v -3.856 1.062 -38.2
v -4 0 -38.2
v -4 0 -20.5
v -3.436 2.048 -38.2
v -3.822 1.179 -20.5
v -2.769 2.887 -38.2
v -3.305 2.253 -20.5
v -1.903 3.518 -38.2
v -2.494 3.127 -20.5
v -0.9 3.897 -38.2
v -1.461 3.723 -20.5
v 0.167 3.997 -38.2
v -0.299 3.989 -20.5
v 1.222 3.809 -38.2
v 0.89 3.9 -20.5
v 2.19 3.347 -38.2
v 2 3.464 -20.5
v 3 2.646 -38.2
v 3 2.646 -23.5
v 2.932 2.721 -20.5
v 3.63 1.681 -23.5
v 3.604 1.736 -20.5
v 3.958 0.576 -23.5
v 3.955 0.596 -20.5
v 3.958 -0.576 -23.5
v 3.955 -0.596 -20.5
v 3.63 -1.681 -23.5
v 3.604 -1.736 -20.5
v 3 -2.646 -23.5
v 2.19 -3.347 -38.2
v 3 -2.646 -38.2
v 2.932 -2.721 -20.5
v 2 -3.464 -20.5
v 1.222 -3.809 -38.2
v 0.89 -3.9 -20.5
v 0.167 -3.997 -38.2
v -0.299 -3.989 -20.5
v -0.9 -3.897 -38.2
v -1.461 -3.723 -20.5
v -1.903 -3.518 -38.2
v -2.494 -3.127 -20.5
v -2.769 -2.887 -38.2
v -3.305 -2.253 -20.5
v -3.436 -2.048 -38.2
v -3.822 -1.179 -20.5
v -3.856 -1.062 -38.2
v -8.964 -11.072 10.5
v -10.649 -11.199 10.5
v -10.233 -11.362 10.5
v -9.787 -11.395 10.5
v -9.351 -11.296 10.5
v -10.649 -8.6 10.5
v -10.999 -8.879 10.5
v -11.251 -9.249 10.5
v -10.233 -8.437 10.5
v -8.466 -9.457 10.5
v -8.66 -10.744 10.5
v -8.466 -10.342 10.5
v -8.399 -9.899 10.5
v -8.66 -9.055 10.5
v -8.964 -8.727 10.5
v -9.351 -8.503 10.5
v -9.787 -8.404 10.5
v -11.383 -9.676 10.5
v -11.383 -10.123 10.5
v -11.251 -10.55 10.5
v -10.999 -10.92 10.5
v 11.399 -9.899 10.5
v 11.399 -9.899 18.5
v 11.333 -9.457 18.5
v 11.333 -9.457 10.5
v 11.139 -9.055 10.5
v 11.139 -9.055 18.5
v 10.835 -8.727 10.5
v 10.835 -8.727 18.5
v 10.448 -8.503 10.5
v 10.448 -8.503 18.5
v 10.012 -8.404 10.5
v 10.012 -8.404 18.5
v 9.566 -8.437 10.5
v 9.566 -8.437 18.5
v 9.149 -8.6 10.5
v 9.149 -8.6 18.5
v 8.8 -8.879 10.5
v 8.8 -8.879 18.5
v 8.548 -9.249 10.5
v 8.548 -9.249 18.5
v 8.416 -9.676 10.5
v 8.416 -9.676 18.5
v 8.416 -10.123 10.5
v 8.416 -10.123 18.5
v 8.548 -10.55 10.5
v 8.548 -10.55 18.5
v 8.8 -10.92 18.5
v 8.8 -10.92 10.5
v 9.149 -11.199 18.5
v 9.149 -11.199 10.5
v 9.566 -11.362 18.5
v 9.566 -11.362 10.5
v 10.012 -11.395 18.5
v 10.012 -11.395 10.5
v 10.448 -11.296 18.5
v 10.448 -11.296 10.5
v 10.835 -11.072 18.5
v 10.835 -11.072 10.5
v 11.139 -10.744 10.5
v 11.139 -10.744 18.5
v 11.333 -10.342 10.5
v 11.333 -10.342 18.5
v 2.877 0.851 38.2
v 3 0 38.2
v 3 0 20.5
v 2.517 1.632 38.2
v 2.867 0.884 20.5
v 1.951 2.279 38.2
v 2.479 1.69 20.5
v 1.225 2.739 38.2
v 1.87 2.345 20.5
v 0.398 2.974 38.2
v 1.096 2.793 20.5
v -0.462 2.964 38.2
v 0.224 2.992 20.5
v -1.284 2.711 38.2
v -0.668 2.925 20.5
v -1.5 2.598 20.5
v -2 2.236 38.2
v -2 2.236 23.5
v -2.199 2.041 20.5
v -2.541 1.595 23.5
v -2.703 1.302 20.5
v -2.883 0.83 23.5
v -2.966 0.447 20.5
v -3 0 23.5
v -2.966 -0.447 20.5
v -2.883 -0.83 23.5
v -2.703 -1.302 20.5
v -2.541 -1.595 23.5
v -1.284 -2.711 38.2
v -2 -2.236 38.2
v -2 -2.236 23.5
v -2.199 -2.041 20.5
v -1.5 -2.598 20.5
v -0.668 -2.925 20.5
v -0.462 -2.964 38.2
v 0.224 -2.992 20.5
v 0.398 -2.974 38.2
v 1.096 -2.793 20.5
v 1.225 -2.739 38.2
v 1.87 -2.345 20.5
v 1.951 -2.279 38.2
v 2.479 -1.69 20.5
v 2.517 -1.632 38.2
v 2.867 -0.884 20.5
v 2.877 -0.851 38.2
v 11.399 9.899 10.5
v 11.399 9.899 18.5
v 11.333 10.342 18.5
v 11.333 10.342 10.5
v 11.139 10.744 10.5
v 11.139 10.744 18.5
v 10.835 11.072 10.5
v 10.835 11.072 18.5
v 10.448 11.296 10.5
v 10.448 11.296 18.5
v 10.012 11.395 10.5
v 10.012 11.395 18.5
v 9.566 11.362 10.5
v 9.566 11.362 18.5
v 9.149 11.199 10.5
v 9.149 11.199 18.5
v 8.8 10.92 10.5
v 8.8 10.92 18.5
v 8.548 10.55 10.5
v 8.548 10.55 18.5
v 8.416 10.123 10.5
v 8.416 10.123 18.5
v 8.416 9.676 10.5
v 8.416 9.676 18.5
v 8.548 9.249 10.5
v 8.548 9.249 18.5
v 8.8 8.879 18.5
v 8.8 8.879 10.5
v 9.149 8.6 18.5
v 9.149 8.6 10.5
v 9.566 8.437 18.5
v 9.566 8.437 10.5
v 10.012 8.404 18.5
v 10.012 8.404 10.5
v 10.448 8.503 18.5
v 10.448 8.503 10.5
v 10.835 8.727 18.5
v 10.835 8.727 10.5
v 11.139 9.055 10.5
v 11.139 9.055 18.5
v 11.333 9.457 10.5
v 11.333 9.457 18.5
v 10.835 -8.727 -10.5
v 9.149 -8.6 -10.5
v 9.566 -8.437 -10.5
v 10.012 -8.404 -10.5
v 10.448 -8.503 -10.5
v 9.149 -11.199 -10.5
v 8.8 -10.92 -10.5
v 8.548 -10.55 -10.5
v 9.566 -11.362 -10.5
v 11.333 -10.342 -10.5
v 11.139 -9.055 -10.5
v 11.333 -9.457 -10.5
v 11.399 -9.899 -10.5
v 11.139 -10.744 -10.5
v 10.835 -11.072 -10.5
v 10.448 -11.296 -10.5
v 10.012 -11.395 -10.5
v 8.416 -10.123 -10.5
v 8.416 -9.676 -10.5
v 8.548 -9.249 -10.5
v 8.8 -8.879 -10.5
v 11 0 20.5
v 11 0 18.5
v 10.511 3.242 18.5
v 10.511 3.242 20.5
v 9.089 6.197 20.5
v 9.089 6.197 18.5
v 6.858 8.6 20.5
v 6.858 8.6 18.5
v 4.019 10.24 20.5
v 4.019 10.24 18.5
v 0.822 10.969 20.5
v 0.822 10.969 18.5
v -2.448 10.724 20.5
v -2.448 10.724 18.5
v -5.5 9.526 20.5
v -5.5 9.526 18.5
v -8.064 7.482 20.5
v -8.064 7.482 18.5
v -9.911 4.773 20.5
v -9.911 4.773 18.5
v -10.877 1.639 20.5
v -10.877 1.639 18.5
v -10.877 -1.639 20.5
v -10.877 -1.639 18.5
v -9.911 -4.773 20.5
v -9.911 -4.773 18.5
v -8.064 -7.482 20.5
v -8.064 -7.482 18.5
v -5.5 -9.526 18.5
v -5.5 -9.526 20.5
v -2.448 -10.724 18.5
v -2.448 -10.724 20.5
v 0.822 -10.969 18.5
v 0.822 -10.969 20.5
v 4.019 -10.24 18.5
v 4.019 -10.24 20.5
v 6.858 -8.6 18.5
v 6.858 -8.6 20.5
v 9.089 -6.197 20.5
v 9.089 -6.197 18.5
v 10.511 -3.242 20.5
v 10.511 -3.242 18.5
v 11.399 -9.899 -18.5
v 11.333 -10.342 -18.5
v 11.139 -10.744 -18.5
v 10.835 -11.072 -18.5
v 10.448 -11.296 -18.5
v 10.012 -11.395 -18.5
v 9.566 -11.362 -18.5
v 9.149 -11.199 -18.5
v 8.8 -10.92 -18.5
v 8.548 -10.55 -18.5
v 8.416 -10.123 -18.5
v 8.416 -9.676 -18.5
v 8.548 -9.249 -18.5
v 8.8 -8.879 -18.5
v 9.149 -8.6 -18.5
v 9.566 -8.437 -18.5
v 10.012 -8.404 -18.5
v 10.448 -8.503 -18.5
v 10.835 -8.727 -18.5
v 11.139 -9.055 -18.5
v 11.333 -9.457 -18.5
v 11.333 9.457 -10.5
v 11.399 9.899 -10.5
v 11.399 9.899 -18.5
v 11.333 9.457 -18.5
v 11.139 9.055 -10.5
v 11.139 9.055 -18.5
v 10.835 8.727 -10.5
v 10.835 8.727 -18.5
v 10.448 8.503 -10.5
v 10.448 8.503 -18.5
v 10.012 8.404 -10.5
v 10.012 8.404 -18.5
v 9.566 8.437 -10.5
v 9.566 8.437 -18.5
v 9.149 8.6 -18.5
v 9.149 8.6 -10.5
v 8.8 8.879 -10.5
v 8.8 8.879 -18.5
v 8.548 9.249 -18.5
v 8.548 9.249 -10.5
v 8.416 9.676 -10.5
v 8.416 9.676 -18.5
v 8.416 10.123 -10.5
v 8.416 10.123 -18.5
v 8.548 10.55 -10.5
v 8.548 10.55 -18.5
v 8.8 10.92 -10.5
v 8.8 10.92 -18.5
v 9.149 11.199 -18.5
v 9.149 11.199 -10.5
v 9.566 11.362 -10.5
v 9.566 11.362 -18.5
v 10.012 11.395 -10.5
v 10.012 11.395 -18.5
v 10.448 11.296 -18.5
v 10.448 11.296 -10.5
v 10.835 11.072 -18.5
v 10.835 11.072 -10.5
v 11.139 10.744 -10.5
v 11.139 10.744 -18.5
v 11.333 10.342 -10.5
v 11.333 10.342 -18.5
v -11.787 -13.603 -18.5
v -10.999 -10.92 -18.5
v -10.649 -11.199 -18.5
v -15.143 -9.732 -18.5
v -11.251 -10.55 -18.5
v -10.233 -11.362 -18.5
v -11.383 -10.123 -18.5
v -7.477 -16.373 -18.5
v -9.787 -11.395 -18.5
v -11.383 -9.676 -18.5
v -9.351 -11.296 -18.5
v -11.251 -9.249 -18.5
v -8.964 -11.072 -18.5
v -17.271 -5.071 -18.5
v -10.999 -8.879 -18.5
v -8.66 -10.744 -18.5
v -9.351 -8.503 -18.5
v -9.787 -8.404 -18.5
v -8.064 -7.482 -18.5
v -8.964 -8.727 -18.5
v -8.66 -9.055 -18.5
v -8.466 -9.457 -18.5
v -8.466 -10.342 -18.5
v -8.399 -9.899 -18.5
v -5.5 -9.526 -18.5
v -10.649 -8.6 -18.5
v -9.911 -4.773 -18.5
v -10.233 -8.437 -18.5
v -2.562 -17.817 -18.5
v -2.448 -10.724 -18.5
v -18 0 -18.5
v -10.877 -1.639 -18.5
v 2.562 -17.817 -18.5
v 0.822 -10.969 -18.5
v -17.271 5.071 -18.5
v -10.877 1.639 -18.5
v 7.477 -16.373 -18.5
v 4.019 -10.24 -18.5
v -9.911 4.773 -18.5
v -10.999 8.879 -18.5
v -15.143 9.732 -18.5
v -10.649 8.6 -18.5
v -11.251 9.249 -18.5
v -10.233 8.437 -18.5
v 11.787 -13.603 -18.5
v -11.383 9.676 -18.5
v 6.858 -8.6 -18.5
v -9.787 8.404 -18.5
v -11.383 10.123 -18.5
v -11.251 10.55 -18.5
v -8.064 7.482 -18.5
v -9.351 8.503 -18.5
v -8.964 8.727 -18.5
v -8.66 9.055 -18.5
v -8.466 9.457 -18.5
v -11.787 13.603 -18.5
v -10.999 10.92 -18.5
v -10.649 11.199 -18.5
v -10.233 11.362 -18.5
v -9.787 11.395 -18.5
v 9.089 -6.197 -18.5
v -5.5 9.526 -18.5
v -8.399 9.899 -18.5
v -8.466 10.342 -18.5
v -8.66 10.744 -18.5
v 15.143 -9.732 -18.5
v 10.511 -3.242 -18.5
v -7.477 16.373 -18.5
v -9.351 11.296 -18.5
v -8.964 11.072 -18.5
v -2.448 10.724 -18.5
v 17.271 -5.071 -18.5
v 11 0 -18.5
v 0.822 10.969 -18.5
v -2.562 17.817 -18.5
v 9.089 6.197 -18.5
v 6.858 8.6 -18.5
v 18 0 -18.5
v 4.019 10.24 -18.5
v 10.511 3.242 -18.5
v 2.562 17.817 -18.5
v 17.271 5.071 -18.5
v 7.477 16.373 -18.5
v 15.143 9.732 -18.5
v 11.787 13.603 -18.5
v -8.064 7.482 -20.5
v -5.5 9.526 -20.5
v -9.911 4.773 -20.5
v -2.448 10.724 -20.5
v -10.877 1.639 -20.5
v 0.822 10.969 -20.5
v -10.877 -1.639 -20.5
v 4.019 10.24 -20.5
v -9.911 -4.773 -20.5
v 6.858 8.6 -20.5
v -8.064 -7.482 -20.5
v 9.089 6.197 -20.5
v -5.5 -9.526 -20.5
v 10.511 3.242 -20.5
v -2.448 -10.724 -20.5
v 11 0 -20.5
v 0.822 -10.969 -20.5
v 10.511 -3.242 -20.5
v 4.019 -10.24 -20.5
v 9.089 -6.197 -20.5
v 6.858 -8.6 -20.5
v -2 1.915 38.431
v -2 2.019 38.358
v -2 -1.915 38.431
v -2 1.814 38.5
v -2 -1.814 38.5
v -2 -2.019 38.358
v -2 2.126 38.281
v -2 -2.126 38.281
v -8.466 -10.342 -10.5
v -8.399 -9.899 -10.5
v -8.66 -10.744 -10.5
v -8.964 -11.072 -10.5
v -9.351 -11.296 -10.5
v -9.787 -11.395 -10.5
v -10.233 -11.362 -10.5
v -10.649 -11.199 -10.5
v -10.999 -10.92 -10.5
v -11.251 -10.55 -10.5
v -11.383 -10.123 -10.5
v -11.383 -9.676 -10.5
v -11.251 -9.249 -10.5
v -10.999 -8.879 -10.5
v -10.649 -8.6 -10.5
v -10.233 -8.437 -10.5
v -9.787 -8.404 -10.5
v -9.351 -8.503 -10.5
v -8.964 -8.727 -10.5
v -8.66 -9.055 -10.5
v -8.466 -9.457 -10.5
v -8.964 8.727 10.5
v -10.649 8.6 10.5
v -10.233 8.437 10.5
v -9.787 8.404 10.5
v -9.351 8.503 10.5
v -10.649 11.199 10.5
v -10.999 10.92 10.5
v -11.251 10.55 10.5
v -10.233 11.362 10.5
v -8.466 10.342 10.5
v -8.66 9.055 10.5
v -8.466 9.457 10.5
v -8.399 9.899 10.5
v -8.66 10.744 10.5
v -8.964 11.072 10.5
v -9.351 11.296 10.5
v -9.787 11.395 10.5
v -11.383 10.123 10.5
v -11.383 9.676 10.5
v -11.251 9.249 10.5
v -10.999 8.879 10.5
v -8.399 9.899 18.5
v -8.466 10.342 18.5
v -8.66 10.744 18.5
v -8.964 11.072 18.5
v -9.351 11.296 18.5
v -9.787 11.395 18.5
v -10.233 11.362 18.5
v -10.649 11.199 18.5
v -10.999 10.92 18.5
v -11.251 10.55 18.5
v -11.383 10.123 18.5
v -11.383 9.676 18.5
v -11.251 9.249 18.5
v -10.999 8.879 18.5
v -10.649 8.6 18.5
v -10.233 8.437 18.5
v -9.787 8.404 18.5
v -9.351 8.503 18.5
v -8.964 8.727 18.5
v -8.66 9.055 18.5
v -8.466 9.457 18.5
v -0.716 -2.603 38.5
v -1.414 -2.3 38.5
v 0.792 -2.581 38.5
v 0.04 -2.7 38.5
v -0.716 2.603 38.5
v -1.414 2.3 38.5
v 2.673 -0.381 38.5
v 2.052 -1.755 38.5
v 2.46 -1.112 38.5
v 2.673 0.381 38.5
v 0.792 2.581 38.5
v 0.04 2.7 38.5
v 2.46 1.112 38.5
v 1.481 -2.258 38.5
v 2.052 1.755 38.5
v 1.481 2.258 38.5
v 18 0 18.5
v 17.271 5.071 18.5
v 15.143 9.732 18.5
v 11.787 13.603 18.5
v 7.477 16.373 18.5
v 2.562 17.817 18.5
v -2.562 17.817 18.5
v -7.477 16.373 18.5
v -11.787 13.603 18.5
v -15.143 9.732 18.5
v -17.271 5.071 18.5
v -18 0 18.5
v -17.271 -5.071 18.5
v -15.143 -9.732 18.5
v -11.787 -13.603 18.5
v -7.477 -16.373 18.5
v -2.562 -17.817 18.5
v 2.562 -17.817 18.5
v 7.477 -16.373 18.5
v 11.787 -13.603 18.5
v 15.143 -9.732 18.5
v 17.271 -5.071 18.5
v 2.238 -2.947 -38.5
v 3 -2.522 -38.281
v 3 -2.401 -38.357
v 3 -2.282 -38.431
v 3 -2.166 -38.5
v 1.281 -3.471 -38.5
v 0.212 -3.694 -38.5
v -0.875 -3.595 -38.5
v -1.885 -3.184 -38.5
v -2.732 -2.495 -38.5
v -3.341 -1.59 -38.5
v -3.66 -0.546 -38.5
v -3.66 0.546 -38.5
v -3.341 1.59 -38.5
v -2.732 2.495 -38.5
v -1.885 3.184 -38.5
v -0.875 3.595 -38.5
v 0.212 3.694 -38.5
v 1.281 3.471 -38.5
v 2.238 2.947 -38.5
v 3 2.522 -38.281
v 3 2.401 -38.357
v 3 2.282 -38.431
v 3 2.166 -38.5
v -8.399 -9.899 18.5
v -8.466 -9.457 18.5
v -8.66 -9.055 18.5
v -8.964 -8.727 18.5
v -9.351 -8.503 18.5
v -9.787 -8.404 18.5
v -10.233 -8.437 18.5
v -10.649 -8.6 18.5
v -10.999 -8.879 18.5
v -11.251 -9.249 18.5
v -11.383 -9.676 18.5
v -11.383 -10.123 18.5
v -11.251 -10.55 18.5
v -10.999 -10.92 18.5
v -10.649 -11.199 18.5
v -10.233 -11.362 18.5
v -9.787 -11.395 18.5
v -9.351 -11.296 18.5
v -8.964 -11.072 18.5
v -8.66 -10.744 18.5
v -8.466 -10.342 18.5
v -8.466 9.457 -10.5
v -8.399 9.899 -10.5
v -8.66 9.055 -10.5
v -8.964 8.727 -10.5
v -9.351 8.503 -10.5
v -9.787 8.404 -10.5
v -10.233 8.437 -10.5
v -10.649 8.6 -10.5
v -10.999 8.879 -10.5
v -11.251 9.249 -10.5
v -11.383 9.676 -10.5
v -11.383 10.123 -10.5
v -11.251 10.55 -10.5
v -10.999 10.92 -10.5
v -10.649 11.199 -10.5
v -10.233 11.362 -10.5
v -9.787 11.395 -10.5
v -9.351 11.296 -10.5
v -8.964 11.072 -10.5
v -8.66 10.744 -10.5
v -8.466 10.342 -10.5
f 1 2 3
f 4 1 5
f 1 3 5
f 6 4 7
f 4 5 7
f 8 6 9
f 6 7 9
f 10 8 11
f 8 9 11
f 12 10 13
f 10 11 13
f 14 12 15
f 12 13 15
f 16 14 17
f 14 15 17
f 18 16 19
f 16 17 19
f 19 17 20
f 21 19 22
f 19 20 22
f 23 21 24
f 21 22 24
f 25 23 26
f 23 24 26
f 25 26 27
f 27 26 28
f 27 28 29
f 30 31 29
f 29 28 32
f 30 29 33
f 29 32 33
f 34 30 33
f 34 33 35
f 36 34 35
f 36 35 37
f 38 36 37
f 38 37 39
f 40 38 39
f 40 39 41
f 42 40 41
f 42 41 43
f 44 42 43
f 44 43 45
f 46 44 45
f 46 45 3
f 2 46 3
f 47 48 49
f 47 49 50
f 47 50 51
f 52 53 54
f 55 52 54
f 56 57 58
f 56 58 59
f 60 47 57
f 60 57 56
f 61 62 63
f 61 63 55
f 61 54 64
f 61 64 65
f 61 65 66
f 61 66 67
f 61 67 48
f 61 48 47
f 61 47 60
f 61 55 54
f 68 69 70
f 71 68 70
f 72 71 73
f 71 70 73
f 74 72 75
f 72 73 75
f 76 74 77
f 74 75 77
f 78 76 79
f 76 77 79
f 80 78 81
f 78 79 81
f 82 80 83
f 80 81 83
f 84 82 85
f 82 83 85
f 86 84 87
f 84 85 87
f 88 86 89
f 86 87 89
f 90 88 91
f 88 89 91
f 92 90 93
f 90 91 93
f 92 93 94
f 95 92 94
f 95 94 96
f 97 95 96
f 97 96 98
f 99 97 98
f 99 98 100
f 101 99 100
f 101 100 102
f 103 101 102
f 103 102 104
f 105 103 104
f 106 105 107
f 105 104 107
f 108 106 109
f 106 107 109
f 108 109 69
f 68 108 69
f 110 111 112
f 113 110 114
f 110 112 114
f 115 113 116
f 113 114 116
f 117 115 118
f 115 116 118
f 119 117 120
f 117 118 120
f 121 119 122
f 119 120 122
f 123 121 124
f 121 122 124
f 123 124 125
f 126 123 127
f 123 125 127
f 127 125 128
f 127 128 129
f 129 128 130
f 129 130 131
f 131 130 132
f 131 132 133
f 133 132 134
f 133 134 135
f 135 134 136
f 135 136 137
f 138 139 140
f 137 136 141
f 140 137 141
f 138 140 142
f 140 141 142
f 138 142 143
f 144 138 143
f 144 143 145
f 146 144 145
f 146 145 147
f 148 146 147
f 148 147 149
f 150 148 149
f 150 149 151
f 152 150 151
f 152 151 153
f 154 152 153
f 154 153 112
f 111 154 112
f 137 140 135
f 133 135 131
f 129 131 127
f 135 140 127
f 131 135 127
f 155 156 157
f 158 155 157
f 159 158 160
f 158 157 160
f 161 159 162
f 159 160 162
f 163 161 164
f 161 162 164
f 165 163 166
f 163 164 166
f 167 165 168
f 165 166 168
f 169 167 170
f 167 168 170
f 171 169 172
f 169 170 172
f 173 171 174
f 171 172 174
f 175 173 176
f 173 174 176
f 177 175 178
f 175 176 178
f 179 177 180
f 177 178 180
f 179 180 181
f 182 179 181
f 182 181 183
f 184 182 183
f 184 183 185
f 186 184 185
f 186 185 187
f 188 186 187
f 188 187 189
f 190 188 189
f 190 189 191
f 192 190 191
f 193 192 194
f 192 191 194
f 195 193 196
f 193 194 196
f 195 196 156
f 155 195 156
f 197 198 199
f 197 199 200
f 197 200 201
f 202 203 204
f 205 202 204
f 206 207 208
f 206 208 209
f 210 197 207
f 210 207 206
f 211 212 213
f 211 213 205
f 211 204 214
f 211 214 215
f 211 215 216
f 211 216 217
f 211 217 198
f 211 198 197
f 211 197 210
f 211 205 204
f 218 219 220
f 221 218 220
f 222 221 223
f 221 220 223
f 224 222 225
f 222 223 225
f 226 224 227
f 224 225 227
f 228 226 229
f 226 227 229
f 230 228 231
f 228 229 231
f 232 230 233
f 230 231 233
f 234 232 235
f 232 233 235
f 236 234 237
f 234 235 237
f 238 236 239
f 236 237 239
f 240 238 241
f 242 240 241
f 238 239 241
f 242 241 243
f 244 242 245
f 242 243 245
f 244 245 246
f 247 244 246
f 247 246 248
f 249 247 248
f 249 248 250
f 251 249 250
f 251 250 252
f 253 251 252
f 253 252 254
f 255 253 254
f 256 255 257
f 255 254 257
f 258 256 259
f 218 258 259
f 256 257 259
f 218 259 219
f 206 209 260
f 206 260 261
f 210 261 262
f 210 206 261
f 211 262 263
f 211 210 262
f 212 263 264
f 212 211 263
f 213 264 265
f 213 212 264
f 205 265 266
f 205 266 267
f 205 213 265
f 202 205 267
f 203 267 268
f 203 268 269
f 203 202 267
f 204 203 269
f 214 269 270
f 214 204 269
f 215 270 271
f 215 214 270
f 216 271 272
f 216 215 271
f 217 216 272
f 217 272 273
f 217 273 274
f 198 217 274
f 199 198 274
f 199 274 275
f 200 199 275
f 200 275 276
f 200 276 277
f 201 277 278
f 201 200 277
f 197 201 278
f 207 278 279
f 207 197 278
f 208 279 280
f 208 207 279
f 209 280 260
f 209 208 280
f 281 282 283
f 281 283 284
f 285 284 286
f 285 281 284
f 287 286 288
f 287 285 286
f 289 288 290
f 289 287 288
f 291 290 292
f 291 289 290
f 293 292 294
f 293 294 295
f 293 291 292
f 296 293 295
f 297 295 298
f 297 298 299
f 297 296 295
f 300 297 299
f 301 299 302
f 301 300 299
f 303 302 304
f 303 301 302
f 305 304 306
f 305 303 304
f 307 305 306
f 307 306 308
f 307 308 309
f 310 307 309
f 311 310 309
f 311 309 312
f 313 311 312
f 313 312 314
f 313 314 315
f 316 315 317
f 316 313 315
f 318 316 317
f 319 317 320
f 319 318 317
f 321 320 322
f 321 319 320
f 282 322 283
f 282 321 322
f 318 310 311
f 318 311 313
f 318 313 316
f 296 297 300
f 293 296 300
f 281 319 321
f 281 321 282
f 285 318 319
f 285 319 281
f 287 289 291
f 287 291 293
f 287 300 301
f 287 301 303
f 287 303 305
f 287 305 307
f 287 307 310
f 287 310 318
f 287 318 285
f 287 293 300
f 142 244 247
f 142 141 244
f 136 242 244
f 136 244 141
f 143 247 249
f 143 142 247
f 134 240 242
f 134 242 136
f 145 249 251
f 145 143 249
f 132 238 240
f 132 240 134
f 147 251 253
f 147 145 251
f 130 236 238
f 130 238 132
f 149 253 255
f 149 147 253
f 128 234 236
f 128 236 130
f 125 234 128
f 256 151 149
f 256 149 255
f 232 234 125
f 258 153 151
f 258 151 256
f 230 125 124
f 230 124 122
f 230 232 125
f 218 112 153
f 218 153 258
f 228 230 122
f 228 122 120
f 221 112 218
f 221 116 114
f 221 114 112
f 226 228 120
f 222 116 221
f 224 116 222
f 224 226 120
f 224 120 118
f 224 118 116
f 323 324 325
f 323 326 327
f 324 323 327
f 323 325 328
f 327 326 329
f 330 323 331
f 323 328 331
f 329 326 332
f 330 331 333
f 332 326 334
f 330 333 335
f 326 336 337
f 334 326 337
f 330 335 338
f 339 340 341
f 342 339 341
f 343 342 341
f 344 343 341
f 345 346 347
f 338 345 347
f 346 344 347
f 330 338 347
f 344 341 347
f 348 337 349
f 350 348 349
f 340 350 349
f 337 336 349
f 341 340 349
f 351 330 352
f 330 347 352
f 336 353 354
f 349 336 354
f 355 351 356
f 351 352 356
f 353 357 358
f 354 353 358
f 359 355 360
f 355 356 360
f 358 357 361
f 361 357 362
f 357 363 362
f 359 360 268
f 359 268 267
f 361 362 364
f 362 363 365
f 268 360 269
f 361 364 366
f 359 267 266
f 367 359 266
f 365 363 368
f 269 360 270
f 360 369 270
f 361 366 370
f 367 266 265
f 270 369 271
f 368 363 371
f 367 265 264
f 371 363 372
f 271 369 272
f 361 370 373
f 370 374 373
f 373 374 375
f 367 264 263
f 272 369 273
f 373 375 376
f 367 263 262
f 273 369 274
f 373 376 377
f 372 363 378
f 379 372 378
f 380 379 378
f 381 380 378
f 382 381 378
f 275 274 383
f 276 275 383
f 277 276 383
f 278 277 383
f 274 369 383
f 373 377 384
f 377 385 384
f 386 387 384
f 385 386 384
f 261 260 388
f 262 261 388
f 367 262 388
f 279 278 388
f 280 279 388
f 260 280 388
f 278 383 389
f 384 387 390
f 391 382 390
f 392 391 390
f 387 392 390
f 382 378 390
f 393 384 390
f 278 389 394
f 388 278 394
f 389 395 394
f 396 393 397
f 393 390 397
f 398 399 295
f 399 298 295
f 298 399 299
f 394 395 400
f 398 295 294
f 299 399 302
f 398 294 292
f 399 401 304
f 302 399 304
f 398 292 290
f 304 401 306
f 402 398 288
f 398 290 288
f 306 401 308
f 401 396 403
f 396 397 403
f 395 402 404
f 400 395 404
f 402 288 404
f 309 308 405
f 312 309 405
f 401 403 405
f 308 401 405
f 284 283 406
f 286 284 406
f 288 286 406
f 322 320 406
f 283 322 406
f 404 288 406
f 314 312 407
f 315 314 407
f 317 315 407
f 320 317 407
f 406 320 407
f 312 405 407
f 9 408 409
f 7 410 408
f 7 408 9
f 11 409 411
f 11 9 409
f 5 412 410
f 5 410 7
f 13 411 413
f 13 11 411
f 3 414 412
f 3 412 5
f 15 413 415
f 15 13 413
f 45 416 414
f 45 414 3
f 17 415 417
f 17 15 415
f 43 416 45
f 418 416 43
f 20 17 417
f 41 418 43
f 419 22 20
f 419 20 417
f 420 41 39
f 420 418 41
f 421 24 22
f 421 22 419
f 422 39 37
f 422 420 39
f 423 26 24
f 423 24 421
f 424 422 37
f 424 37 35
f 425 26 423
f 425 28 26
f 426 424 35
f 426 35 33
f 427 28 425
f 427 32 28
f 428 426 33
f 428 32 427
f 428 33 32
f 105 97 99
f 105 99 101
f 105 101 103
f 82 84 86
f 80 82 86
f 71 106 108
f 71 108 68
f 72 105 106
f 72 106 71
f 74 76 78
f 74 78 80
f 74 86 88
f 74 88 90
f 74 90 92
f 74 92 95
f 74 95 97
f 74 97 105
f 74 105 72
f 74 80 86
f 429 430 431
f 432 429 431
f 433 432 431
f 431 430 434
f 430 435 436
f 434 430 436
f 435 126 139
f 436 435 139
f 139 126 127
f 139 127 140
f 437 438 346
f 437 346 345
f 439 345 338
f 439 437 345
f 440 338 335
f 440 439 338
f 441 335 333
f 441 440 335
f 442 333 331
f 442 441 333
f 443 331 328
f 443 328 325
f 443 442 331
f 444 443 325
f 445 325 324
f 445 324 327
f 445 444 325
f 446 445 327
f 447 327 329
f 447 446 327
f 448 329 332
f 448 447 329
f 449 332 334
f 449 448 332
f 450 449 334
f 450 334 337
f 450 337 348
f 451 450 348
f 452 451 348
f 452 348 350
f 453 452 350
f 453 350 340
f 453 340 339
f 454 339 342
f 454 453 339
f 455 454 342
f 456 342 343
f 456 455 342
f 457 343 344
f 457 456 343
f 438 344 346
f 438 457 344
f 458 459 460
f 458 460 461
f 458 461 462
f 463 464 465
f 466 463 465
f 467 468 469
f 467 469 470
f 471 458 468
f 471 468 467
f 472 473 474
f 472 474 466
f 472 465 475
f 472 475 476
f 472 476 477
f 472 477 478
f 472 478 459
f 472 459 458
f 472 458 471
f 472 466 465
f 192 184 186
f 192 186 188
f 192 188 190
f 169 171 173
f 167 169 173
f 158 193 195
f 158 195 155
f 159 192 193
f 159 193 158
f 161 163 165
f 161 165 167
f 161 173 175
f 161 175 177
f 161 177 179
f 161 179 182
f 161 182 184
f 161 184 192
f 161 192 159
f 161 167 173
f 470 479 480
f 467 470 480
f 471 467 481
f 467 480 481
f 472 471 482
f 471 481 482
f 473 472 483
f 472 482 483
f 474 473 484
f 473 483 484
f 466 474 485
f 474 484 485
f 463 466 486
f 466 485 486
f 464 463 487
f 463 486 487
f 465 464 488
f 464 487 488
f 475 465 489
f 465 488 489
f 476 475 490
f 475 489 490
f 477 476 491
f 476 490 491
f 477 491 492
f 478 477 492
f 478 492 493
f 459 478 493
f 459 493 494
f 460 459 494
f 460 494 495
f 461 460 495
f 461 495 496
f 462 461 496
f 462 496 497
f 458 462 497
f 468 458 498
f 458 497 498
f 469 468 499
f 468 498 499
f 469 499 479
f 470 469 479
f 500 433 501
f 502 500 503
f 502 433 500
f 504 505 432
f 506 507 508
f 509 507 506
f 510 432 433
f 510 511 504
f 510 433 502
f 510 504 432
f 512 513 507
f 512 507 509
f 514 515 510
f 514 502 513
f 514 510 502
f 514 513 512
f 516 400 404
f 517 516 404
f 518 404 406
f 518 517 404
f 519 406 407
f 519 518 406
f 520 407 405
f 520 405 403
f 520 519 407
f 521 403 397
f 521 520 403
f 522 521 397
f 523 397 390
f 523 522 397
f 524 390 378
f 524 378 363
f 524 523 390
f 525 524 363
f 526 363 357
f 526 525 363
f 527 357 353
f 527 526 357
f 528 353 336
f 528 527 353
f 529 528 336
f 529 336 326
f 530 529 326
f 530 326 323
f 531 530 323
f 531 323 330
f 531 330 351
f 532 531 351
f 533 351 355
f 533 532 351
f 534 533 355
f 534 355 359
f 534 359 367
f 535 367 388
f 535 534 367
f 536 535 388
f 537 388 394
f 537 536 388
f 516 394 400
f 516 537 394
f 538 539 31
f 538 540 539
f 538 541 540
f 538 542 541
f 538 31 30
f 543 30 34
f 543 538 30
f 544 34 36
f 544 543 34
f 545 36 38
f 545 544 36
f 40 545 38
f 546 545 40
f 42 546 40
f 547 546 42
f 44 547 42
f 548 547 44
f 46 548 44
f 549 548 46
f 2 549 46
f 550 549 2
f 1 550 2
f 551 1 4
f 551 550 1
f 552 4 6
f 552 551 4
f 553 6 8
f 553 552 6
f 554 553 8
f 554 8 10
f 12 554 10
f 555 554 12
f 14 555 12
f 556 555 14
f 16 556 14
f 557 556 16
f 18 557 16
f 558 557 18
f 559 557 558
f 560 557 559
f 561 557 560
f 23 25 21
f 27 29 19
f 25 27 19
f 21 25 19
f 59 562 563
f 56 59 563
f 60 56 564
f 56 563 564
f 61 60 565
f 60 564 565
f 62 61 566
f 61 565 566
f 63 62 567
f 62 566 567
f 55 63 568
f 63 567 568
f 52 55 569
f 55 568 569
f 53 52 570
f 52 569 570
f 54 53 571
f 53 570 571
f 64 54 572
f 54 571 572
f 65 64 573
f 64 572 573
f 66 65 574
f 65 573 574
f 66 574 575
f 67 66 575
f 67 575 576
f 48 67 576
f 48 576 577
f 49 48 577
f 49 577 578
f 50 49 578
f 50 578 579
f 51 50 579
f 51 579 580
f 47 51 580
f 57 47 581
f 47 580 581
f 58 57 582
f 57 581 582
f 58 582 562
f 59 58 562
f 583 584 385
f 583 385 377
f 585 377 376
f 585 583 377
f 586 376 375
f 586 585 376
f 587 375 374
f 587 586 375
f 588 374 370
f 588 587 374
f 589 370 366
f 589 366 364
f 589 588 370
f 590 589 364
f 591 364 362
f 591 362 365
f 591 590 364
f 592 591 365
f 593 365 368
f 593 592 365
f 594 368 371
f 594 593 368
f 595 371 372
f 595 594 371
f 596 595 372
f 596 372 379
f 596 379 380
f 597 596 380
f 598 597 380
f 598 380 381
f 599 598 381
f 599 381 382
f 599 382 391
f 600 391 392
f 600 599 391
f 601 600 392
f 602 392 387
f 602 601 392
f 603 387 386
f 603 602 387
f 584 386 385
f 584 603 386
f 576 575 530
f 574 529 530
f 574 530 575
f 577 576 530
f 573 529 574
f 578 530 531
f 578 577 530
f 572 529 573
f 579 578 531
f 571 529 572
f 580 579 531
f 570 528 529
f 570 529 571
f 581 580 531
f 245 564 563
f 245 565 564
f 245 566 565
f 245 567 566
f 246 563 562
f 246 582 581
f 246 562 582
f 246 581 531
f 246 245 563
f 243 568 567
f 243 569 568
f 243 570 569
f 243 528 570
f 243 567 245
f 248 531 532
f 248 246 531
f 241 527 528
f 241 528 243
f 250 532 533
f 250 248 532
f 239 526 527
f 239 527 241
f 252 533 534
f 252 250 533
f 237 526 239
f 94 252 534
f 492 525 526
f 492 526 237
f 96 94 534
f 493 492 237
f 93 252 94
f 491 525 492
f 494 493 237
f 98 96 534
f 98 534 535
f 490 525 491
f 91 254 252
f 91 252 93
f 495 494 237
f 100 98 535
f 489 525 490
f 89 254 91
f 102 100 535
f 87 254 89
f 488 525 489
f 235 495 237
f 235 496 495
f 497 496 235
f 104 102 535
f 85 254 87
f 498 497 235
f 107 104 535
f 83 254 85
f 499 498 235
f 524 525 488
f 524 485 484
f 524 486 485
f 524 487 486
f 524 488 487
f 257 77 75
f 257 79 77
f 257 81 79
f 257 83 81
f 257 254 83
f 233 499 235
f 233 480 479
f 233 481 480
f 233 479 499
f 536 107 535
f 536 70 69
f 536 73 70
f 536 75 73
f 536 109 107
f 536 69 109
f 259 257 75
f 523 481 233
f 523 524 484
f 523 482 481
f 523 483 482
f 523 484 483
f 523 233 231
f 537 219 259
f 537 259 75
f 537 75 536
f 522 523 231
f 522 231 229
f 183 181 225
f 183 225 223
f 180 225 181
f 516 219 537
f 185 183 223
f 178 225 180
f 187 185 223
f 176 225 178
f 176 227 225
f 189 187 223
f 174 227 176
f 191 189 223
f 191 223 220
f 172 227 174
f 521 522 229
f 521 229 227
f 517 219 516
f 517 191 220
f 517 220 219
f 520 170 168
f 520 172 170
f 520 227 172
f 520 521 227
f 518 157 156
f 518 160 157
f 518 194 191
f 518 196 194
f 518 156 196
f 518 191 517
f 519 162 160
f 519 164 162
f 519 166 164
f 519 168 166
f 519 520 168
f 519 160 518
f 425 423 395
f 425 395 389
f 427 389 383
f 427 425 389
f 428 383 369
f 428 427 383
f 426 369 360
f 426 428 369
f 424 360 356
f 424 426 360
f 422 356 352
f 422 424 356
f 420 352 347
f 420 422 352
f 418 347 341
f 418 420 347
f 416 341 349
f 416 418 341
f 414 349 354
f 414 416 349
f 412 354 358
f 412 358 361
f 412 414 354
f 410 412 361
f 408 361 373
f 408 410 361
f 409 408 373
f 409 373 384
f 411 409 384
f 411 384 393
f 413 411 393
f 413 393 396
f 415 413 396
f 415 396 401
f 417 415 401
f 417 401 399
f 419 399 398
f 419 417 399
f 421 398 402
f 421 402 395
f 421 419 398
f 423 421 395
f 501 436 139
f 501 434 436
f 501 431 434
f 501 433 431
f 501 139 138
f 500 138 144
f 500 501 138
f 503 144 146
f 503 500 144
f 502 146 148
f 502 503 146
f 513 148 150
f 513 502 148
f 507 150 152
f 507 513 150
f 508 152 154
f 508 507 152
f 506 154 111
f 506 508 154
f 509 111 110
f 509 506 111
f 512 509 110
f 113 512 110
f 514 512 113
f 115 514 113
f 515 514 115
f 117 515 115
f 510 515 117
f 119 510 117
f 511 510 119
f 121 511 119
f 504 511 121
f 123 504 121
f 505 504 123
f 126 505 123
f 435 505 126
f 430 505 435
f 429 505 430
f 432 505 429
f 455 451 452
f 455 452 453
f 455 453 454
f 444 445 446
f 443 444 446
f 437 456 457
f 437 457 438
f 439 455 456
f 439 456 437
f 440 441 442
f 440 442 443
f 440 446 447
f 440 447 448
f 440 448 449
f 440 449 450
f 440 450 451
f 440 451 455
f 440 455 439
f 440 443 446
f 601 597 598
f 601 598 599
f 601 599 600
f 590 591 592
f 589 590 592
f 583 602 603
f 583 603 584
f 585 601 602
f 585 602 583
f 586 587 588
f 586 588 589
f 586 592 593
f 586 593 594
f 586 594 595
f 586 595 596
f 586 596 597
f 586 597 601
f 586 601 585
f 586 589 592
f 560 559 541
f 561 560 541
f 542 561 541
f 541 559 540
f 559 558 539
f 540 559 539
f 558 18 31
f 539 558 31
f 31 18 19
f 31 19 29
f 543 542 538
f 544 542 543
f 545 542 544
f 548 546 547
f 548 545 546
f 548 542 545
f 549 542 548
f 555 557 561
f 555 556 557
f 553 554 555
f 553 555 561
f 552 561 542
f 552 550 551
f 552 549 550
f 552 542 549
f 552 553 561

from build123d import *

# Parameters (mm, degrees)
SKETCH_1_R          = 18
EXTRUDE_1_DEPTH     = 18.5
SKETCH_2_R          = 3
EXTRUDE_2_DEPTH     = 20
SKETCH_3_R          = 11
EXTRUDE_3_DEPTH     = 2
SKETCH_4_R          = 1.5
CUT_EXTRUDE_1_DEPTH = 8
SKETCH_5_R          = 4
EXTRUDE_4_DEPTH     = 20
EXTRUDE_START       = 2
SKETCH_6_R          = 11
EXTRUDE_5_DEPTH     = 2
CUT_EXTRUDE_START   = -8
SKETCH_7_R          = 1.5
CUT_EXTRUDE_2_DEPTH = 8
CUT_EXTRUDE_START_2 = -15
CUT_EXTRUDE_3_DEPTH = 15
CUT_EXTRUDE_4_DEPTH = 15
CHAMFER_1_SIZE      = 0.3


with BuildPart() as part:
    # 草图1 → 凸台-拉伸1 (new, symmetric)
    with BuildSketch(Plane.XY):
        Circle(SKETCH_1_R)
    extrude(amount=EXTRUDE_1_DEPTH, both=True)

    # 草图2 → 凸台-拉伸2 (add)
    with BuildSketch(Plane.XY.offset(18.5)):
        Circle(SKETCH_2_R)
    extrude(amount=EXTRUDE_2_DEPTH)

    # 草图3 → 凸台-拉伸3 (add)
    with BuildSketch(Plane.XY.offset(18.5)):
        Circle(SKETCH_3_R)
    extrude(amount=EXTRUDE_3_DEPTH)

    # 草图4 → 切除-拉伸1 (cut)
    with BuildSketch(Plane.XY.offset(18.5)):
        with Locations((-9.899494937, 9.899494937)):
            Circle(SKETCH_4_R)
        with Locations((9.899494937, 9.899494937)):
            Circle(SKETCH_4_R)
        with Locations((9.899494937, -9.899494937)):
            Circle(SKETCH_4_R)
        with Locations((-9.899494937, -9.899494937)):
            Circle(SKETCH_4_R)
    extrude(amount=-CUT_EXTRUDE_1_DEPTH, mode=Mode.SUBTRACT)

    # 草图5 → 凸台-拉伸4 (add)
    with BuildSketch(Plane(origin=(0, 0, -18.5), x_dir=(-1, 0, 0), z_dir=(0, 0, -1))):
        Circle(SKETCH_5_R)
    extrude(amount=EXTRUDE_4_DEPTH)

    # 草图6 → 凸台-拉伸5 (add)
    with BuildSketch(Plane(origin=(0, 0, -18.5), x_dir=(-1, 0, 0), z_dir=(0, 0, -1)).offset(EXTRUDE_START)):
        with Locations(Location((0, 0, 0), (0, 0, 180))):
            Circle(SKETCH_6_R)
    extrude(amount=-EXTRUDE_5_DEPTH)

    # 草图7 → 切除-拉伸2 (cut)
    with BuildSketch(Plane(origin=(0, 0, -18.5), x_dir=(-1, 0, 0), z_dir=(0, 0, -1)).offset(CUT_EXTRUDE_START)):
        with Locations(Location((-9.899494937, 9.899494937, 0), (0, 0, 180))):
            Circle(SKETCH_7_R)
        with Locations(Location((9.899494937, 9.899494937, 0), (0, 0, 180))):
            Circle(SKETCH_7_R)
        with Locations(Location((9.899494937, -9.899494937, 0), (0, 0, 180))):
            Circle(SKETCH_7_R)
        with Locations(Location((-9.899494937, -9.899494937, 0), (0, 0, 180))):
            Circle(SKETCH_7_R)
    extrude(amount=CUT_EXTRUDE_2_DEPTH, mode=Mode.SUBTRACT)

    # 草图8 → 切除-拉伸3 (cut)
    with BuildSketch(Plane.XY.offset(38.5).offset(CUT_EXTRUDE_START_2)):
        with BuildLine():
            Line((-2, 2.236067977), (-2, -2.236067977))
            ThreePointArc((-2, -2.236067977), (-3, 0), (-2, 2.236067977))
        make_face()
    extrude(amount=CUT_EXTRUDE_3_DEPTH, mode=Mode.SUBTRACT)

    # 草图9 → 切除-拉伸4 (cut)
    with BuildSketch(Plane(origin=(0, 0, -38.5), x_dir=(-1, 0, 0), z_dir=(0, 0, -1)).offset(CUT_EXTRUDE_START_2)):
        with BuildLine():
            Line((-3, 2.645751311), (-3, -2.645751311))
            ThreePointArc((-3, -2.645751311), (-4, 0), (-3, 2.645751311))
        make_face()
    extrude(amount=CUT_EXTRUDE_4_DEPTH, mode=Mode.SUBTRACT)

    # 倒角1
    chamfer_1_edges = [part.edges().sort_by_distance(p)[0] for p in [
        (1.224744871, -2.738612788, 38.5),
        (-1.414213562, -3.741657387, -38.5),
    ]]
    chamfer(chamfer_1_edges, length=CHAMFER_1_SIZE)


solid = part.part
